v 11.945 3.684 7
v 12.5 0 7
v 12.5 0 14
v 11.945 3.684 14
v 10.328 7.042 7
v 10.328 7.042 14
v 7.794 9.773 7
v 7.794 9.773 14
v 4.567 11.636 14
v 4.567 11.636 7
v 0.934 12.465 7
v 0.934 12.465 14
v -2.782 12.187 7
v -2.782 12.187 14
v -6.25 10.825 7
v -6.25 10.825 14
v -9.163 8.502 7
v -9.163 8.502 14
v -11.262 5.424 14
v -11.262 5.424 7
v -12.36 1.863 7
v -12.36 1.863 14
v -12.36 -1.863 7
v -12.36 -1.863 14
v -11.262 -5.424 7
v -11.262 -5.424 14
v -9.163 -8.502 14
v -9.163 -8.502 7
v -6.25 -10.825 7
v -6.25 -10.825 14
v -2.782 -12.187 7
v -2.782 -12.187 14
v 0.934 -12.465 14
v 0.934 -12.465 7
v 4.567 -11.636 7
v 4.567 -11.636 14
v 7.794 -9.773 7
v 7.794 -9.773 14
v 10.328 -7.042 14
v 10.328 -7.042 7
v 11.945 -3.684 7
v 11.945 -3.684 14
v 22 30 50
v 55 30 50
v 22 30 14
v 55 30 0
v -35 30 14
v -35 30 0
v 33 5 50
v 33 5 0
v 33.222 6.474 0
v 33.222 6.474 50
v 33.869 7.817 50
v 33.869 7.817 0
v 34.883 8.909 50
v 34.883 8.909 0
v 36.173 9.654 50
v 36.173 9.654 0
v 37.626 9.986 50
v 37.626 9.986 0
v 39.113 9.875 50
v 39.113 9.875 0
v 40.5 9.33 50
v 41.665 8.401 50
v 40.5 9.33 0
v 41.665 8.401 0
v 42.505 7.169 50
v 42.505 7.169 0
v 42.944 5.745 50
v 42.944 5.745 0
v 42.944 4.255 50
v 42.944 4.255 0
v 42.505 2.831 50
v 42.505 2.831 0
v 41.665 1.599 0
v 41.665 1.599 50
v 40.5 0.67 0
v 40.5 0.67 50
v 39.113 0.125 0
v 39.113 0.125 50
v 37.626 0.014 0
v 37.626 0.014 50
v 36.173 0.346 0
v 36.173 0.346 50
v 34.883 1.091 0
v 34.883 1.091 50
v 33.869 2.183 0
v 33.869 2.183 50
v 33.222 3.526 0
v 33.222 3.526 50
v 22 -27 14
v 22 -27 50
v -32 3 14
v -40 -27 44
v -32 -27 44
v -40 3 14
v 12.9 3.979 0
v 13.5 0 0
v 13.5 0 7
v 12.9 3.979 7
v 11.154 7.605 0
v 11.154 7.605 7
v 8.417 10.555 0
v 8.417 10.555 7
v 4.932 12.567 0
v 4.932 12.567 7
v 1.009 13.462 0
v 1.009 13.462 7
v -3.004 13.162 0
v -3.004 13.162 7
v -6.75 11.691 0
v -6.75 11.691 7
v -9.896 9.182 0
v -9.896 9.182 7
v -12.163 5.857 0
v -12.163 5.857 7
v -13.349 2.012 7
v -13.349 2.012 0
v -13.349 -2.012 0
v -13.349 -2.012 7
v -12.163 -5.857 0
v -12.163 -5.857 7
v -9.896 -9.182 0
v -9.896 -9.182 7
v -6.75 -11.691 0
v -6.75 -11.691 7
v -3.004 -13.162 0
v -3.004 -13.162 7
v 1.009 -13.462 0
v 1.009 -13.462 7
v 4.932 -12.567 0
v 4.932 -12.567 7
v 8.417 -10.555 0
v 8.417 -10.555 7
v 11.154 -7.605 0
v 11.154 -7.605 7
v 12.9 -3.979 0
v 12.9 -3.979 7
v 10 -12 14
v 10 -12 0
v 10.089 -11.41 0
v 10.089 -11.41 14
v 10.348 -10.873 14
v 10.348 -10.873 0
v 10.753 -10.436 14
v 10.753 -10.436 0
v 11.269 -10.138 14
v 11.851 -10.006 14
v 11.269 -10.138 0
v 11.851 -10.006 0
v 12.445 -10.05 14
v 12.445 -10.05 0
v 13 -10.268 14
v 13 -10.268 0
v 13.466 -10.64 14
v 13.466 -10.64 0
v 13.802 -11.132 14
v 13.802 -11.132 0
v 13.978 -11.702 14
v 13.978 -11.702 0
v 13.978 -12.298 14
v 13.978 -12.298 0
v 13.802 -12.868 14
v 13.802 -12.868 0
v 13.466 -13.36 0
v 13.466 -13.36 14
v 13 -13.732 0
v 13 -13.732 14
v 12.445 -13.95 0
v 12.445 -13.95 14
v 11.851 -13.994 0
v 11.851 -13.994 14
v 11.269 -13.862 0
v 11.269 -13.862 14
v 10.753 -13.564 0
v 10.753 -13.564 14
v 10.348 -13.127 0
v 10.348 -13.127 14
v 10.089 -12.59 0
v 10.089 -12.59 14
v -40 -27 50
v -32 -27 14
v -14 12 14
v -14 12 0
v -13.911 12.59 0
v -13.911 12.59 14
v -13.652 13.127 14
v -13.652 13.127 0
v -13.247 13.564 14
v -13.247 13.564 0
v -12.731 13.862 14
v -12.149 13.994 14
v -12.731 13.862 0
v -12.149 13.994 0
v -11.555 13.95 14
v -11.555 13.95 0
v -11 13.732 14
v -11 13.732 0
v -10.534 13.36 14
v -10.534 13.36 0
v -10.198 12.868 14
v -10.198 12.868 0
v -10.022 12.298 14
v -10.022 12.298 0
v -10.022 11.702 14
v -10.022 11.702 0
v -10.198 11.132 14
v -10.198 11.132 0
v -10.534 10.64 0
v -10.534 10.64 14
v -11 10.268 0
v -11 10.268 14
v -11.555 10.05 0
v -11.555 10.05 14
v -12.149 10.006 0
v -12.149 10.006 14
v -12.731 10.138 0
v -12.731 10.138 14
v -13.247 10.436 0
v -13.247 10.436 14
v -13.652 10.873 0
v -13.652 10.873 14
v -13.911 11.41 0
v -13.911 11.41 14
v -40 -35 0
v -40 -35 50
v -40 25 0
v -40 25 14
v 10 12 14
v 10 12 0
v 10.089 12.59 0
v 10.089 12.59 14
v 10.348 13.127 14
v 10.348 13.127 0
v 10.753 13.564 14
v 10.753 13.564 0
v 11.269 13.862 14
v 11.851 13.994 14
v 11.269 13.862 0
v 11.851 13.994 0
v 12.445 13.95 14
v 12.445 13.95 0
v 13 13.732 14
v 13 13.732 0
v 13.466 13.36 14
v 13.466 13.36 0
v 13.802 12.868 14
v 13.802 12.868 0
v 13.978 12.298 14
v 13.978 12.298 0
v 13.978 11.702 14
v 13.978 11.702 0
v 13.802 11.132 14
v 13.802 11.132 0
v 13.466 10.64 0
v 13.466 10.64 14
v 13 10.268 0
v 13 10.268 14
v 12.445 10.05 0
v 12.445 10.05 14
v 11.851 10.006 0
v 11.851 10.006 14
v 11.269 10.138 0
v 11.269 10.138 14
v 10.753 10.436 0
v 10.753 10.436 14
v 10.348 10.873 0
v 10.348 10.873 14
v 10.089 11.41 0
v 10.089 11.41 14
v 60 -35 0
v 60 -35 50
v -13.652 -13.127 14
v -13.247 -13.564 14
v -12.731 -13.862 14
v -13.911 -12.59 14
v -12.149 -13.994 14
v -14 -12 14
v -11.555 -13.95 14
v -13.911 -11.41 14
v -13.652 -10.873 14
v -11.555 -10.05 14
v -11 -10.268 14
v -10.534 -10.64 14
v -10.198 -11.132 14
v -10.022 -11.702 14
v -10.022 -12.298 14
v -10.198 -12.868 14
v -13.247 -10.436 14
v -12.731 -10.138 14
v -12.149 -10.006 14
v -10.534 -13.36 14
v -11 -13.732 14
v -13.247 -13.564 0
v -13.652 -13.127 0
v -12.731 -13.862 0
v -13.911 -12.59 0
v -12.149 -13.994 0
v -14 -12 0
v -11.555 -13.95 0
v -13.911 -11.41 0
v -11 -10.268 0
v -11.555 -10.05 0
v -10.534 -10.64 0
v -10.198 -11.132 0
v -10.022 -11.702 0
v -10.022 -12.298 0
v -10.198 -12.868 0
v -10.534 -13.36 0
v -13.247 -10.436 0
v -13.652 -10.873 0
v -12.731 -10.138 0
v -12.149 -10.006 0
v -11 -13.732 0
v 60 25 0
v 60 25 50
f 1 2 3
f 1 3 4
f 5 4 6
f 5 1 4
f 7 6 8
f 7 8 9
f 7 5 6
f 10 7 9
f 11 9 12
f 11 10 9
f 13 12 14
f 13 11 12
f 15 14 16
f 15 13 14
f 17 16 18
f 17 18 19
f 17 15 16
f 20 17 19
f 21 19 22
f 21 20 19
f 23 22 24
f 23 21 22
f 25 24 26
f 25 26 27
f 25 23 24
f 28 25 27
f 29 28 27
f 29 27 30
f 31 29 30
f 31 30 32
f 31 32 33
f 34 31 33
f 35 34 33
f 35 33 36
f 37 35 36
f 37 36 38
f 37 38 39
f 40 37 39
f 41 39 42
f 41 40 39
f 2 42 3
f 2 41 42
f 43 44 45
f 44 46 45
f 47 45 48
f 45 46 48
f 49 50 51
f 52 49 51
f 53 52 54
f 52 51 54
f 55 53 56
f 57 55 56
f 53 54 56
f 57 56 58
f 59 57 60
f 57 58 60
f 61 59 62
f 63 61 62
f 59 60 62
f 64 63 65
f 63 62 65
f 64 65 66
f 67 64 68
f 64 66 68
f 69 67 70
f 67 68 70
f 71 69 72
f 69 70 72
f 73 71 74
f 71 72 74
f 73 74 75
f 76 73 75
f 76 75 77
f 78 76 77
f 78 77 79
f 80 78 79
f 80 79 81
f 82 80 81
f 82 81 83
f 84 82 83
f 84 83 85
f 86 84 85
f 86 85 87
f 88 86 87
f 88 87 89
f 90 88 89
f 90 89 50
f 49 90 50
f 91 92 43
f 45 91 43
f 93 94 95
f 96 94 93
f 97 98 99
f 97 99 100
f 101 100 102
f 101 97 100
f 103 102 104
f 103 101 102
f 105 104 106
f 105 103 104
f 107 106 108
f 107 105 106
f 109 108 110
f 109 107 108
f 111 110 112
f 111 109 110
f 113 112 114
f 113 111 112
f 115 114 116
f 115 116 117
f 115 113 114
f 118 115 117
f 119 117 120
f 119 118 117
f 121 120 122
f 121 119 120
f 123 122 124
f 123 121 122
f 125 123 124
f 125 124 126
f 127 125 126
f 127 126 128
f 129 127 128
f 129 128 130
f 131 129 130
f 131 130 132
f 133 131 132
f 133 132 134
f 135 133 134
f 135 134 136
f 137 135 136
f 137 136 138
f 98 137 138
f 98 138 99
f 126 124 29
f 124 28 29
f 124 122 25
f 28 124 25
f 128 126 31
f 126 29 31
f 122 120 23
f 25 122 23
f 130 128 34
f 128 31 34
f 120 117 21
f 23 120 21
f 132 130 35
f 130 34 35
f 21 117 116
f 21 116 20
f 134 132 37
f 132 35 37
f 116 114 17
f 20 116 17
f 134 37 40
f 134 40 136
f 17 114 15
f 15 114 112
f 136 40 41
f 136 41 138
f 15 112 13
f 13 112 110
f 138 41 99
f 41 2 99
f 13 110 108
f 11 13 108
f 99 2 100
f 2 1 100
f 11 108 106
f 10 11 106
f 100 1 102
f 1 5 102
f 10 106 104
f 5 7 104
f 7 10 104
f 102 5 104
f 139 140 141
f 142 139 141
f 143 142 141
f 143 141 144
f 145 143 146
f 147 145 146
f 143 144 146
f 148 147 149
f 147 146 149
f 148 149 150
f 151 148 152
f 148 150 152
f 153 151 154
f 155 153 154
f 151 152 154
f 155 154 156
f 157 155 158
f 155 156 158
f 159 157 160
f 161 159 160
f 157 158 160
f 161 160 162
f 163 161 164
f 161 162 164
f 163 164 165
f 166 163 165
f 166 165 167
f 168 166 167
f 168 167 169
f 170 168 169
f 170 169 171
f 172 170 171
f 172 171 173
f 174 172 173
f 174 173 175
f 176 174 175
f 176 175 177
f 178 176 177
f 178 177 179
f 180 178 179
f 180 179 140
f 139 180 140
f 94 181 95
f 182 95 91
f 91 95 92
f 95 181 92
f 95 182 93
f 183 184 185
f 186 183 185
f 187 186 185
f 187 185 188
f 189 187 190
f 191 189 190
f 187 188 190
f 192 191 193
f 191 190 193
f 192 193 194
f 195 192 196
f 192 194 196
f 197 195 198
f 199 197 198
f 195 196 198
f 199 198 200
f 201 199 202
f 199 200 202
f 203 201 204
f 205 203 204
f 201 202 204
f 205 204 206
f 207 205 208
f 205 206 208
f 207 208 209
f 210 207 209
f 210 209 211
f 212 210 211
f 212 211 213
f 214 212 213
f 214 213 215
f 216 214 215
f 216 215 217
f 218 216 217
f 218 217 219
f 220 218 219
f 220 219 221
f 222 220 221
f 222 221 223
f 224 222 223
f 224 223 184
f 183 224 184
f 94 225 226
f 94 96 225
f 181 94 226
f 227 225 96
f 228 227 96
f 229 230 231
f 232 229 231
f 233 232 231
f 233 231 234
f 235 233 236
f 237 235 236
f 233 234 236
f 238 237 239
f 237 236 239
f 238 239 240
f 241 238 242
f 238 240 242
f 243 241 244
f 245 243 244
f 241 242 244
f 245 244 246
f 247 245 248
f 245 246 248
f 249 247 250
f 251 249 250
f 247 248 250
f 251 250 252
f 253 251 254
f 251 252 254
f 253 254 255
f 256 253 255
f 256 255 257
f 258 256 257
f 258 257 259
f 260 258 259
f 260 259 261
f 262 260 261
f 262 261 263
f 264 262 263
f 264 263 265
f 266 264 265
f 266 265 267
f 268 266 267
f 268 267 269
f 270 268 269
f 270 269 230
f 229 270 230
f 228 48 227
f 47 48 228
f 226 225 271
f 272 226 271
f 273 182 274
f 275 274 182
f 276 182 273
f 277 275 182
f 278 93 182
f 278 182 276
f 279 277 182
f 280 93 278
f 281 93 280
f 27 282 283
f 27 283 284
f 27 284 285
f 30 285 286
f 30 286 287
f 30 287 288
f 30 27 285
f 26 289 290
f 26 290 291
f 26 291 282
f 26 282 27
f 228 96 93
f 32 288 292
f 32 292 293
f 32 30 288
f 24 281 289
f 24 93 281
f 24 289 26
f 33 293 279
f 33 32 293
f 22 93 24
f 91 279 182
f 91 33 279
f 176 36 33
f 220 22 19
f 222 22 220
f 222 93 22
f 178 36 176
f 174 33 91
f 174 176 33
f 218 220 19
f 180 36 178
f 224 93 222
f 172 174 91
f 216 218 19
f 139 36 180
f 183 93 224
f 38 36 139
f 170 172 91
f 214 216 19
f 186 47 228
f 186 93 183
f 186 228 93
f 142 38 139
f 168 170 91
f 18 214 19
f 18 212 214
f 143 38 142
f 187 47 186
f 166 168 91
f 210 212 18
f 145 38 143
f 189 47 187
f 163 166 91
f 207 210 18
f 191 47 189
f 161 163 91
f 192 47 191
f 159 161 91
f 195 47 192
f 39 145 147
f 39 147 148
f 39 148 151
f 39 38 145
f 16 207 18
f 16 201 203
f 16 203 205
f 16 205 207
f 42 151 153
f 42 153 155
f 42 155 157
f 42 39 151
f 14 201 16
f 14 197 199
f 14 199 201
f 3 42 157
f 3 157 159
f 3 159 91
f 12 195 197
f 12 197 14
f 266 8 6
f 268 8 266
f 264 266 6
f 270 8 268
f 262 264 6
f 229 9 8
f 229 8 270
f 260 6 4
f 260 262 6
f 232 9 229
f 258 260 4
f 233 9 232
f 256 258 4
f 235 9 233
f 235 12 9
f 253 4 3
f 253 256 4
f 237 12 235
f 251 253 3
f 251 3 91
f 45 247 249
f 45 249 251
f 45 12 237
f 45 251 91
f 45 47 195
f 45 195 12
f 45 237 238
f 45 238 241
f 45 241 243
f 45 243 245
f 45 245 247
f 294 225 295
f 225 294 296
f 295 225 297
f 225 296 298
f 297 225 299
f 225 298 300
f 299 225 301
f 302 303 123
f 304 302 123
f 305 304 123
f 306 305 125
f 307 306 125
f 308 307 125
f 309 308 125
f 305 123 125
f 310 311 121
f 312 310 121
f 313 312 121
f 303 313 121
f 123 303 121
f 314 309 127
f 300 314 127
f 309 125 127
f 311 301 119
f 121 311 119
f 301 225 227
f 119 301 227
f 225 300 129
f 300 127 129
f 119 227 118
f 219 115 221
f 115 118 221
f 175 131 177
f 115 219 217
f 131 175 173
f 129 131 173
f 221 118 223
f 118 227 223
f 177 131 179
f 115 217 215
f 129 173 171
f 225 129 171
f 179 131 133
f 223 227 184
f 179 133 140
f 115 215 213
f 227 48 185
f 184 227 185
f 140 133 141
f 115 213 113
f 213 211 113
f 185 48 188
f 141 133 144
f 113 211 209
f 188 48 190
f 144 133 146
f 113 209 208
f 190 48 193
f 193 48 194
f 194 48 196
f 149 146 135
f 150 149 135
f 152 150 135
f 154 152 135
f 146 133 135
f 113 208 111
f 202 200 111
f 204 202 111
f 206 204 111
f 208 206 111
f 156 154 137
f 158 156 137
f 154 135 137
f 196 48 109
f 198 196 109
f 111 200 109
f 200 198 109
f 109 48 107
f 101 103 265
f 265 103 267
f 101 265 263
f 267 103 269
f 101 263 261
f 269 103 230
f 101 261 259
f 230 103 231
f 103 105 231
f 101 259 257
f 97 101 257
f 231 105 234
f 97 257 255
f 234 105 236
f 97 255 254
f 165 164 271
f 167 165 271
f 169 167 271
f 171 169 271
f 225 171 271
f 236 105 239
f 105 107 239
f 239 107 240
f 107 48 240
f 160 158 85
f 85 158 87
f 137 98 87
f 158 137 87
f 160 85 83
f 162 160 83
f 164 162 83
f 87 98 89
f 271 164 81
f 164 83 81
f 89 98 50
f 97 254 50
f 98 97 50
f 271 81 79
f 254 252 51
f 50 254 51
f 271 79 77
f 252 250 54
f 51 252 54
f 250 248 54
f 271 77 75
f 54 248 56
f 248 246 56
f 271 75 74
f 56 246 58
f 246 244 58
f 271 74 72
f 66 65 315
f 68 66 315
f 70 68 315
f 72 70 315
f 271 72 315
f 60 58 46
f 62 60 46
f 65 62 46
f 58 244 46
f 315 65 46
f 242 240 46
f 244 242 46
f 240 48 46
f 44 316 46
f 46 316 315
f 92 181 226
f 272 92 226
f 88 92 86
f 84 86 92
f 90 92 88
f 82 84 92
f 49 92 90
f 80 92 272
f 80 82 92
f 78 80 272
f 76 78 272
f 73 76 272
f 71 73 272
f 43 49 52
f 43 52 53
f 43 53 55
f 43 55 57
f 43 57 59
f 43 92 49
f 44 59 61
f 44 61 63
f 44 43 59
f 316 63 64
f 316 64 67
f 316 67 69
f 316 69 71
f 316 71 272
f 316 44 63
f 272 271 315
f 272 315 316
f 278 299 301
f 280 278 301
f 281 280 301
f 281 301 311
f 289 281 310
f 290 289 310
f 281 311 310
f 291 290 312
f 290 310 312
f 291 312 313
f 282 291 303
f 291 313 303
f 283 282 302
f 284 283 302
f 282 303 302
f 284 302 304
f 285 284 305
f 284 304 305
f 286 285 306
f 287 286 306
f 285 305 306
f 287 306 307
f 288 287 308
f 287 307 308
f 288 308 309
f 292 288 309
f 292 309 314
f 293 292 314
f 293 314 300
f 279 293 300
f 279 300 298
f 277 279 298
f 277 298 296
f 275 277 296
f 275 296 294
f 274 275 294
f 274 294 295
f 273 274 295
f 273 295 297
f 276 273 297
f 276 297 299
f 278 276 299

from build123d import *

# Parameters (mm, degrees)
SKETCH1_R             = 13.5
BOSS_EXTRUDE1_DEPTH   = 14
BOSS_EXTRUDE2_START   = -7
SKETCH2_R             = 13.5
SKETCH2_R_2           = 12.5
BOSS_EXTRUDE2_DEPTH   = 7
F_4_0MM_DOWEL_HOLE1_D = 4
SKETCH16_W            = 100
SKETCH16_H            = 50
BOSS_EXTRUDE3_DEPTH   = 8
BOSS_EXTRUDE4_DEPTH   = 8
CHAMFER2_SIZE         = 5
SKETCH18_W            = 38
SKETCH18_H            = 65
BOSS_EXTRUDE5_DEPTH   = 44
SKETCH15_R            = 5
CUT_EXTRUDE1_DEPTH    = 86.586213843
CHAMFER3_SIZE         = 5


with BuildPart() as part:
    # Sketch1 → Boss-Extrude1 (new body)
    with BuildSketch(Plane.XY):
        Polygon((-40, 0), (-40, -35), (60, -35), (60, 3.080013472), (60, 30), (-40, 30), align=None)
        Circle(SKETCH1_R, mode=Mode.SUBTRACT)
    extrude(amount=BOSS_EXTRUDE1_DEPTH)

    # Sketch2 → Boss-Extrude2 (add)
    with BuildSketch(Plane.XY.offset(14).offset(BOSS_EXTRUDE2_START)):
        Circle(SKETCH2_R)
        Circle(SKETCH2_R_2, mode=Mode.SUBTRACT)
    extrude(amount=BOSS_EXTRUDE2_DEPTH)

    # Ø4.0mm Dowel Hole1 (through all)
    with Locations(Plane.XY.offset(14)):
        with Locations((-12, 12), (12, 12), (12, -12), (-12, -12)):
            Hole(F_4_0MM_DOWEL_HOLE1_D / 2)

    # Sketch16 → Boss-Extrude3 (add)
    with BuildSketch(Plane.XZ.offset(35)):
        with Locations((10, 25)):
            Rectangle(SKETCH16_W, SKETCH16_H)
    extrude(amount=-BOSS_EXTRUDE3_DEPTH)

    # Sketch17 → Boss-Extrude4 (add)
    with BuildSketch(Plane(origin=(60, 0, 0), x_dir=(0, 0, -1), z_dir=(1, 0, 0))):
        Polygon((-44, -27), (-14, 3), (-14, -27), align=None)
    boss_extrude4 = extrude(amount=-BOSS_EXTRUDE4_DEPTH)

    # Mirror1: Boss-Extrude4 across plane
    add(boss_extrude4.mirror(Plane(origin=(10, 0, 0), x_dir=(0, 0, 1), z_dir=(1, 0, 0))))

    # Chamfer2
    chamfer2_edges = [part.edges().sort_by_distance(p)[0] for p in [
        (-40, 30, 7),
    ]]
    chamfer(chamfer2_edges, length=CHAMFER2_SIZE)

    # Sketch18 → Boss-Extrude5 (add)
    with BuildSketch(Plane.XY.offset(50)):
        with Locations((41, -2.5)):
            Rectangle(SKETCH18_W, SKETCH18_H)
    extrude(amount=-BOSS_EXTRUDE5_DEPTH)

    # Sketch15 → Cut-Extrude1 (cut, through all)
    with BuildSketch(Plane(origin=(0, 0, 0), x_dir=(-1, 0, 0), z_dir=(0, 0, -1))):
        with Locations((-38, 5)):
            Circle(SKETCH15_R)
    extrude(amount=-CUT_EXTRUDE1_DEPTH, mode=Mode.SUBTRACT)

    # Chamfer3
    chamfer3_edges = [part.edges().sort_by_distance(p)[0] for p in [
        (60, 30, 25),
    ]]
    chamfer(chamfer3_edges, length=CHAMFER3_SIZE)


solid = part.part
